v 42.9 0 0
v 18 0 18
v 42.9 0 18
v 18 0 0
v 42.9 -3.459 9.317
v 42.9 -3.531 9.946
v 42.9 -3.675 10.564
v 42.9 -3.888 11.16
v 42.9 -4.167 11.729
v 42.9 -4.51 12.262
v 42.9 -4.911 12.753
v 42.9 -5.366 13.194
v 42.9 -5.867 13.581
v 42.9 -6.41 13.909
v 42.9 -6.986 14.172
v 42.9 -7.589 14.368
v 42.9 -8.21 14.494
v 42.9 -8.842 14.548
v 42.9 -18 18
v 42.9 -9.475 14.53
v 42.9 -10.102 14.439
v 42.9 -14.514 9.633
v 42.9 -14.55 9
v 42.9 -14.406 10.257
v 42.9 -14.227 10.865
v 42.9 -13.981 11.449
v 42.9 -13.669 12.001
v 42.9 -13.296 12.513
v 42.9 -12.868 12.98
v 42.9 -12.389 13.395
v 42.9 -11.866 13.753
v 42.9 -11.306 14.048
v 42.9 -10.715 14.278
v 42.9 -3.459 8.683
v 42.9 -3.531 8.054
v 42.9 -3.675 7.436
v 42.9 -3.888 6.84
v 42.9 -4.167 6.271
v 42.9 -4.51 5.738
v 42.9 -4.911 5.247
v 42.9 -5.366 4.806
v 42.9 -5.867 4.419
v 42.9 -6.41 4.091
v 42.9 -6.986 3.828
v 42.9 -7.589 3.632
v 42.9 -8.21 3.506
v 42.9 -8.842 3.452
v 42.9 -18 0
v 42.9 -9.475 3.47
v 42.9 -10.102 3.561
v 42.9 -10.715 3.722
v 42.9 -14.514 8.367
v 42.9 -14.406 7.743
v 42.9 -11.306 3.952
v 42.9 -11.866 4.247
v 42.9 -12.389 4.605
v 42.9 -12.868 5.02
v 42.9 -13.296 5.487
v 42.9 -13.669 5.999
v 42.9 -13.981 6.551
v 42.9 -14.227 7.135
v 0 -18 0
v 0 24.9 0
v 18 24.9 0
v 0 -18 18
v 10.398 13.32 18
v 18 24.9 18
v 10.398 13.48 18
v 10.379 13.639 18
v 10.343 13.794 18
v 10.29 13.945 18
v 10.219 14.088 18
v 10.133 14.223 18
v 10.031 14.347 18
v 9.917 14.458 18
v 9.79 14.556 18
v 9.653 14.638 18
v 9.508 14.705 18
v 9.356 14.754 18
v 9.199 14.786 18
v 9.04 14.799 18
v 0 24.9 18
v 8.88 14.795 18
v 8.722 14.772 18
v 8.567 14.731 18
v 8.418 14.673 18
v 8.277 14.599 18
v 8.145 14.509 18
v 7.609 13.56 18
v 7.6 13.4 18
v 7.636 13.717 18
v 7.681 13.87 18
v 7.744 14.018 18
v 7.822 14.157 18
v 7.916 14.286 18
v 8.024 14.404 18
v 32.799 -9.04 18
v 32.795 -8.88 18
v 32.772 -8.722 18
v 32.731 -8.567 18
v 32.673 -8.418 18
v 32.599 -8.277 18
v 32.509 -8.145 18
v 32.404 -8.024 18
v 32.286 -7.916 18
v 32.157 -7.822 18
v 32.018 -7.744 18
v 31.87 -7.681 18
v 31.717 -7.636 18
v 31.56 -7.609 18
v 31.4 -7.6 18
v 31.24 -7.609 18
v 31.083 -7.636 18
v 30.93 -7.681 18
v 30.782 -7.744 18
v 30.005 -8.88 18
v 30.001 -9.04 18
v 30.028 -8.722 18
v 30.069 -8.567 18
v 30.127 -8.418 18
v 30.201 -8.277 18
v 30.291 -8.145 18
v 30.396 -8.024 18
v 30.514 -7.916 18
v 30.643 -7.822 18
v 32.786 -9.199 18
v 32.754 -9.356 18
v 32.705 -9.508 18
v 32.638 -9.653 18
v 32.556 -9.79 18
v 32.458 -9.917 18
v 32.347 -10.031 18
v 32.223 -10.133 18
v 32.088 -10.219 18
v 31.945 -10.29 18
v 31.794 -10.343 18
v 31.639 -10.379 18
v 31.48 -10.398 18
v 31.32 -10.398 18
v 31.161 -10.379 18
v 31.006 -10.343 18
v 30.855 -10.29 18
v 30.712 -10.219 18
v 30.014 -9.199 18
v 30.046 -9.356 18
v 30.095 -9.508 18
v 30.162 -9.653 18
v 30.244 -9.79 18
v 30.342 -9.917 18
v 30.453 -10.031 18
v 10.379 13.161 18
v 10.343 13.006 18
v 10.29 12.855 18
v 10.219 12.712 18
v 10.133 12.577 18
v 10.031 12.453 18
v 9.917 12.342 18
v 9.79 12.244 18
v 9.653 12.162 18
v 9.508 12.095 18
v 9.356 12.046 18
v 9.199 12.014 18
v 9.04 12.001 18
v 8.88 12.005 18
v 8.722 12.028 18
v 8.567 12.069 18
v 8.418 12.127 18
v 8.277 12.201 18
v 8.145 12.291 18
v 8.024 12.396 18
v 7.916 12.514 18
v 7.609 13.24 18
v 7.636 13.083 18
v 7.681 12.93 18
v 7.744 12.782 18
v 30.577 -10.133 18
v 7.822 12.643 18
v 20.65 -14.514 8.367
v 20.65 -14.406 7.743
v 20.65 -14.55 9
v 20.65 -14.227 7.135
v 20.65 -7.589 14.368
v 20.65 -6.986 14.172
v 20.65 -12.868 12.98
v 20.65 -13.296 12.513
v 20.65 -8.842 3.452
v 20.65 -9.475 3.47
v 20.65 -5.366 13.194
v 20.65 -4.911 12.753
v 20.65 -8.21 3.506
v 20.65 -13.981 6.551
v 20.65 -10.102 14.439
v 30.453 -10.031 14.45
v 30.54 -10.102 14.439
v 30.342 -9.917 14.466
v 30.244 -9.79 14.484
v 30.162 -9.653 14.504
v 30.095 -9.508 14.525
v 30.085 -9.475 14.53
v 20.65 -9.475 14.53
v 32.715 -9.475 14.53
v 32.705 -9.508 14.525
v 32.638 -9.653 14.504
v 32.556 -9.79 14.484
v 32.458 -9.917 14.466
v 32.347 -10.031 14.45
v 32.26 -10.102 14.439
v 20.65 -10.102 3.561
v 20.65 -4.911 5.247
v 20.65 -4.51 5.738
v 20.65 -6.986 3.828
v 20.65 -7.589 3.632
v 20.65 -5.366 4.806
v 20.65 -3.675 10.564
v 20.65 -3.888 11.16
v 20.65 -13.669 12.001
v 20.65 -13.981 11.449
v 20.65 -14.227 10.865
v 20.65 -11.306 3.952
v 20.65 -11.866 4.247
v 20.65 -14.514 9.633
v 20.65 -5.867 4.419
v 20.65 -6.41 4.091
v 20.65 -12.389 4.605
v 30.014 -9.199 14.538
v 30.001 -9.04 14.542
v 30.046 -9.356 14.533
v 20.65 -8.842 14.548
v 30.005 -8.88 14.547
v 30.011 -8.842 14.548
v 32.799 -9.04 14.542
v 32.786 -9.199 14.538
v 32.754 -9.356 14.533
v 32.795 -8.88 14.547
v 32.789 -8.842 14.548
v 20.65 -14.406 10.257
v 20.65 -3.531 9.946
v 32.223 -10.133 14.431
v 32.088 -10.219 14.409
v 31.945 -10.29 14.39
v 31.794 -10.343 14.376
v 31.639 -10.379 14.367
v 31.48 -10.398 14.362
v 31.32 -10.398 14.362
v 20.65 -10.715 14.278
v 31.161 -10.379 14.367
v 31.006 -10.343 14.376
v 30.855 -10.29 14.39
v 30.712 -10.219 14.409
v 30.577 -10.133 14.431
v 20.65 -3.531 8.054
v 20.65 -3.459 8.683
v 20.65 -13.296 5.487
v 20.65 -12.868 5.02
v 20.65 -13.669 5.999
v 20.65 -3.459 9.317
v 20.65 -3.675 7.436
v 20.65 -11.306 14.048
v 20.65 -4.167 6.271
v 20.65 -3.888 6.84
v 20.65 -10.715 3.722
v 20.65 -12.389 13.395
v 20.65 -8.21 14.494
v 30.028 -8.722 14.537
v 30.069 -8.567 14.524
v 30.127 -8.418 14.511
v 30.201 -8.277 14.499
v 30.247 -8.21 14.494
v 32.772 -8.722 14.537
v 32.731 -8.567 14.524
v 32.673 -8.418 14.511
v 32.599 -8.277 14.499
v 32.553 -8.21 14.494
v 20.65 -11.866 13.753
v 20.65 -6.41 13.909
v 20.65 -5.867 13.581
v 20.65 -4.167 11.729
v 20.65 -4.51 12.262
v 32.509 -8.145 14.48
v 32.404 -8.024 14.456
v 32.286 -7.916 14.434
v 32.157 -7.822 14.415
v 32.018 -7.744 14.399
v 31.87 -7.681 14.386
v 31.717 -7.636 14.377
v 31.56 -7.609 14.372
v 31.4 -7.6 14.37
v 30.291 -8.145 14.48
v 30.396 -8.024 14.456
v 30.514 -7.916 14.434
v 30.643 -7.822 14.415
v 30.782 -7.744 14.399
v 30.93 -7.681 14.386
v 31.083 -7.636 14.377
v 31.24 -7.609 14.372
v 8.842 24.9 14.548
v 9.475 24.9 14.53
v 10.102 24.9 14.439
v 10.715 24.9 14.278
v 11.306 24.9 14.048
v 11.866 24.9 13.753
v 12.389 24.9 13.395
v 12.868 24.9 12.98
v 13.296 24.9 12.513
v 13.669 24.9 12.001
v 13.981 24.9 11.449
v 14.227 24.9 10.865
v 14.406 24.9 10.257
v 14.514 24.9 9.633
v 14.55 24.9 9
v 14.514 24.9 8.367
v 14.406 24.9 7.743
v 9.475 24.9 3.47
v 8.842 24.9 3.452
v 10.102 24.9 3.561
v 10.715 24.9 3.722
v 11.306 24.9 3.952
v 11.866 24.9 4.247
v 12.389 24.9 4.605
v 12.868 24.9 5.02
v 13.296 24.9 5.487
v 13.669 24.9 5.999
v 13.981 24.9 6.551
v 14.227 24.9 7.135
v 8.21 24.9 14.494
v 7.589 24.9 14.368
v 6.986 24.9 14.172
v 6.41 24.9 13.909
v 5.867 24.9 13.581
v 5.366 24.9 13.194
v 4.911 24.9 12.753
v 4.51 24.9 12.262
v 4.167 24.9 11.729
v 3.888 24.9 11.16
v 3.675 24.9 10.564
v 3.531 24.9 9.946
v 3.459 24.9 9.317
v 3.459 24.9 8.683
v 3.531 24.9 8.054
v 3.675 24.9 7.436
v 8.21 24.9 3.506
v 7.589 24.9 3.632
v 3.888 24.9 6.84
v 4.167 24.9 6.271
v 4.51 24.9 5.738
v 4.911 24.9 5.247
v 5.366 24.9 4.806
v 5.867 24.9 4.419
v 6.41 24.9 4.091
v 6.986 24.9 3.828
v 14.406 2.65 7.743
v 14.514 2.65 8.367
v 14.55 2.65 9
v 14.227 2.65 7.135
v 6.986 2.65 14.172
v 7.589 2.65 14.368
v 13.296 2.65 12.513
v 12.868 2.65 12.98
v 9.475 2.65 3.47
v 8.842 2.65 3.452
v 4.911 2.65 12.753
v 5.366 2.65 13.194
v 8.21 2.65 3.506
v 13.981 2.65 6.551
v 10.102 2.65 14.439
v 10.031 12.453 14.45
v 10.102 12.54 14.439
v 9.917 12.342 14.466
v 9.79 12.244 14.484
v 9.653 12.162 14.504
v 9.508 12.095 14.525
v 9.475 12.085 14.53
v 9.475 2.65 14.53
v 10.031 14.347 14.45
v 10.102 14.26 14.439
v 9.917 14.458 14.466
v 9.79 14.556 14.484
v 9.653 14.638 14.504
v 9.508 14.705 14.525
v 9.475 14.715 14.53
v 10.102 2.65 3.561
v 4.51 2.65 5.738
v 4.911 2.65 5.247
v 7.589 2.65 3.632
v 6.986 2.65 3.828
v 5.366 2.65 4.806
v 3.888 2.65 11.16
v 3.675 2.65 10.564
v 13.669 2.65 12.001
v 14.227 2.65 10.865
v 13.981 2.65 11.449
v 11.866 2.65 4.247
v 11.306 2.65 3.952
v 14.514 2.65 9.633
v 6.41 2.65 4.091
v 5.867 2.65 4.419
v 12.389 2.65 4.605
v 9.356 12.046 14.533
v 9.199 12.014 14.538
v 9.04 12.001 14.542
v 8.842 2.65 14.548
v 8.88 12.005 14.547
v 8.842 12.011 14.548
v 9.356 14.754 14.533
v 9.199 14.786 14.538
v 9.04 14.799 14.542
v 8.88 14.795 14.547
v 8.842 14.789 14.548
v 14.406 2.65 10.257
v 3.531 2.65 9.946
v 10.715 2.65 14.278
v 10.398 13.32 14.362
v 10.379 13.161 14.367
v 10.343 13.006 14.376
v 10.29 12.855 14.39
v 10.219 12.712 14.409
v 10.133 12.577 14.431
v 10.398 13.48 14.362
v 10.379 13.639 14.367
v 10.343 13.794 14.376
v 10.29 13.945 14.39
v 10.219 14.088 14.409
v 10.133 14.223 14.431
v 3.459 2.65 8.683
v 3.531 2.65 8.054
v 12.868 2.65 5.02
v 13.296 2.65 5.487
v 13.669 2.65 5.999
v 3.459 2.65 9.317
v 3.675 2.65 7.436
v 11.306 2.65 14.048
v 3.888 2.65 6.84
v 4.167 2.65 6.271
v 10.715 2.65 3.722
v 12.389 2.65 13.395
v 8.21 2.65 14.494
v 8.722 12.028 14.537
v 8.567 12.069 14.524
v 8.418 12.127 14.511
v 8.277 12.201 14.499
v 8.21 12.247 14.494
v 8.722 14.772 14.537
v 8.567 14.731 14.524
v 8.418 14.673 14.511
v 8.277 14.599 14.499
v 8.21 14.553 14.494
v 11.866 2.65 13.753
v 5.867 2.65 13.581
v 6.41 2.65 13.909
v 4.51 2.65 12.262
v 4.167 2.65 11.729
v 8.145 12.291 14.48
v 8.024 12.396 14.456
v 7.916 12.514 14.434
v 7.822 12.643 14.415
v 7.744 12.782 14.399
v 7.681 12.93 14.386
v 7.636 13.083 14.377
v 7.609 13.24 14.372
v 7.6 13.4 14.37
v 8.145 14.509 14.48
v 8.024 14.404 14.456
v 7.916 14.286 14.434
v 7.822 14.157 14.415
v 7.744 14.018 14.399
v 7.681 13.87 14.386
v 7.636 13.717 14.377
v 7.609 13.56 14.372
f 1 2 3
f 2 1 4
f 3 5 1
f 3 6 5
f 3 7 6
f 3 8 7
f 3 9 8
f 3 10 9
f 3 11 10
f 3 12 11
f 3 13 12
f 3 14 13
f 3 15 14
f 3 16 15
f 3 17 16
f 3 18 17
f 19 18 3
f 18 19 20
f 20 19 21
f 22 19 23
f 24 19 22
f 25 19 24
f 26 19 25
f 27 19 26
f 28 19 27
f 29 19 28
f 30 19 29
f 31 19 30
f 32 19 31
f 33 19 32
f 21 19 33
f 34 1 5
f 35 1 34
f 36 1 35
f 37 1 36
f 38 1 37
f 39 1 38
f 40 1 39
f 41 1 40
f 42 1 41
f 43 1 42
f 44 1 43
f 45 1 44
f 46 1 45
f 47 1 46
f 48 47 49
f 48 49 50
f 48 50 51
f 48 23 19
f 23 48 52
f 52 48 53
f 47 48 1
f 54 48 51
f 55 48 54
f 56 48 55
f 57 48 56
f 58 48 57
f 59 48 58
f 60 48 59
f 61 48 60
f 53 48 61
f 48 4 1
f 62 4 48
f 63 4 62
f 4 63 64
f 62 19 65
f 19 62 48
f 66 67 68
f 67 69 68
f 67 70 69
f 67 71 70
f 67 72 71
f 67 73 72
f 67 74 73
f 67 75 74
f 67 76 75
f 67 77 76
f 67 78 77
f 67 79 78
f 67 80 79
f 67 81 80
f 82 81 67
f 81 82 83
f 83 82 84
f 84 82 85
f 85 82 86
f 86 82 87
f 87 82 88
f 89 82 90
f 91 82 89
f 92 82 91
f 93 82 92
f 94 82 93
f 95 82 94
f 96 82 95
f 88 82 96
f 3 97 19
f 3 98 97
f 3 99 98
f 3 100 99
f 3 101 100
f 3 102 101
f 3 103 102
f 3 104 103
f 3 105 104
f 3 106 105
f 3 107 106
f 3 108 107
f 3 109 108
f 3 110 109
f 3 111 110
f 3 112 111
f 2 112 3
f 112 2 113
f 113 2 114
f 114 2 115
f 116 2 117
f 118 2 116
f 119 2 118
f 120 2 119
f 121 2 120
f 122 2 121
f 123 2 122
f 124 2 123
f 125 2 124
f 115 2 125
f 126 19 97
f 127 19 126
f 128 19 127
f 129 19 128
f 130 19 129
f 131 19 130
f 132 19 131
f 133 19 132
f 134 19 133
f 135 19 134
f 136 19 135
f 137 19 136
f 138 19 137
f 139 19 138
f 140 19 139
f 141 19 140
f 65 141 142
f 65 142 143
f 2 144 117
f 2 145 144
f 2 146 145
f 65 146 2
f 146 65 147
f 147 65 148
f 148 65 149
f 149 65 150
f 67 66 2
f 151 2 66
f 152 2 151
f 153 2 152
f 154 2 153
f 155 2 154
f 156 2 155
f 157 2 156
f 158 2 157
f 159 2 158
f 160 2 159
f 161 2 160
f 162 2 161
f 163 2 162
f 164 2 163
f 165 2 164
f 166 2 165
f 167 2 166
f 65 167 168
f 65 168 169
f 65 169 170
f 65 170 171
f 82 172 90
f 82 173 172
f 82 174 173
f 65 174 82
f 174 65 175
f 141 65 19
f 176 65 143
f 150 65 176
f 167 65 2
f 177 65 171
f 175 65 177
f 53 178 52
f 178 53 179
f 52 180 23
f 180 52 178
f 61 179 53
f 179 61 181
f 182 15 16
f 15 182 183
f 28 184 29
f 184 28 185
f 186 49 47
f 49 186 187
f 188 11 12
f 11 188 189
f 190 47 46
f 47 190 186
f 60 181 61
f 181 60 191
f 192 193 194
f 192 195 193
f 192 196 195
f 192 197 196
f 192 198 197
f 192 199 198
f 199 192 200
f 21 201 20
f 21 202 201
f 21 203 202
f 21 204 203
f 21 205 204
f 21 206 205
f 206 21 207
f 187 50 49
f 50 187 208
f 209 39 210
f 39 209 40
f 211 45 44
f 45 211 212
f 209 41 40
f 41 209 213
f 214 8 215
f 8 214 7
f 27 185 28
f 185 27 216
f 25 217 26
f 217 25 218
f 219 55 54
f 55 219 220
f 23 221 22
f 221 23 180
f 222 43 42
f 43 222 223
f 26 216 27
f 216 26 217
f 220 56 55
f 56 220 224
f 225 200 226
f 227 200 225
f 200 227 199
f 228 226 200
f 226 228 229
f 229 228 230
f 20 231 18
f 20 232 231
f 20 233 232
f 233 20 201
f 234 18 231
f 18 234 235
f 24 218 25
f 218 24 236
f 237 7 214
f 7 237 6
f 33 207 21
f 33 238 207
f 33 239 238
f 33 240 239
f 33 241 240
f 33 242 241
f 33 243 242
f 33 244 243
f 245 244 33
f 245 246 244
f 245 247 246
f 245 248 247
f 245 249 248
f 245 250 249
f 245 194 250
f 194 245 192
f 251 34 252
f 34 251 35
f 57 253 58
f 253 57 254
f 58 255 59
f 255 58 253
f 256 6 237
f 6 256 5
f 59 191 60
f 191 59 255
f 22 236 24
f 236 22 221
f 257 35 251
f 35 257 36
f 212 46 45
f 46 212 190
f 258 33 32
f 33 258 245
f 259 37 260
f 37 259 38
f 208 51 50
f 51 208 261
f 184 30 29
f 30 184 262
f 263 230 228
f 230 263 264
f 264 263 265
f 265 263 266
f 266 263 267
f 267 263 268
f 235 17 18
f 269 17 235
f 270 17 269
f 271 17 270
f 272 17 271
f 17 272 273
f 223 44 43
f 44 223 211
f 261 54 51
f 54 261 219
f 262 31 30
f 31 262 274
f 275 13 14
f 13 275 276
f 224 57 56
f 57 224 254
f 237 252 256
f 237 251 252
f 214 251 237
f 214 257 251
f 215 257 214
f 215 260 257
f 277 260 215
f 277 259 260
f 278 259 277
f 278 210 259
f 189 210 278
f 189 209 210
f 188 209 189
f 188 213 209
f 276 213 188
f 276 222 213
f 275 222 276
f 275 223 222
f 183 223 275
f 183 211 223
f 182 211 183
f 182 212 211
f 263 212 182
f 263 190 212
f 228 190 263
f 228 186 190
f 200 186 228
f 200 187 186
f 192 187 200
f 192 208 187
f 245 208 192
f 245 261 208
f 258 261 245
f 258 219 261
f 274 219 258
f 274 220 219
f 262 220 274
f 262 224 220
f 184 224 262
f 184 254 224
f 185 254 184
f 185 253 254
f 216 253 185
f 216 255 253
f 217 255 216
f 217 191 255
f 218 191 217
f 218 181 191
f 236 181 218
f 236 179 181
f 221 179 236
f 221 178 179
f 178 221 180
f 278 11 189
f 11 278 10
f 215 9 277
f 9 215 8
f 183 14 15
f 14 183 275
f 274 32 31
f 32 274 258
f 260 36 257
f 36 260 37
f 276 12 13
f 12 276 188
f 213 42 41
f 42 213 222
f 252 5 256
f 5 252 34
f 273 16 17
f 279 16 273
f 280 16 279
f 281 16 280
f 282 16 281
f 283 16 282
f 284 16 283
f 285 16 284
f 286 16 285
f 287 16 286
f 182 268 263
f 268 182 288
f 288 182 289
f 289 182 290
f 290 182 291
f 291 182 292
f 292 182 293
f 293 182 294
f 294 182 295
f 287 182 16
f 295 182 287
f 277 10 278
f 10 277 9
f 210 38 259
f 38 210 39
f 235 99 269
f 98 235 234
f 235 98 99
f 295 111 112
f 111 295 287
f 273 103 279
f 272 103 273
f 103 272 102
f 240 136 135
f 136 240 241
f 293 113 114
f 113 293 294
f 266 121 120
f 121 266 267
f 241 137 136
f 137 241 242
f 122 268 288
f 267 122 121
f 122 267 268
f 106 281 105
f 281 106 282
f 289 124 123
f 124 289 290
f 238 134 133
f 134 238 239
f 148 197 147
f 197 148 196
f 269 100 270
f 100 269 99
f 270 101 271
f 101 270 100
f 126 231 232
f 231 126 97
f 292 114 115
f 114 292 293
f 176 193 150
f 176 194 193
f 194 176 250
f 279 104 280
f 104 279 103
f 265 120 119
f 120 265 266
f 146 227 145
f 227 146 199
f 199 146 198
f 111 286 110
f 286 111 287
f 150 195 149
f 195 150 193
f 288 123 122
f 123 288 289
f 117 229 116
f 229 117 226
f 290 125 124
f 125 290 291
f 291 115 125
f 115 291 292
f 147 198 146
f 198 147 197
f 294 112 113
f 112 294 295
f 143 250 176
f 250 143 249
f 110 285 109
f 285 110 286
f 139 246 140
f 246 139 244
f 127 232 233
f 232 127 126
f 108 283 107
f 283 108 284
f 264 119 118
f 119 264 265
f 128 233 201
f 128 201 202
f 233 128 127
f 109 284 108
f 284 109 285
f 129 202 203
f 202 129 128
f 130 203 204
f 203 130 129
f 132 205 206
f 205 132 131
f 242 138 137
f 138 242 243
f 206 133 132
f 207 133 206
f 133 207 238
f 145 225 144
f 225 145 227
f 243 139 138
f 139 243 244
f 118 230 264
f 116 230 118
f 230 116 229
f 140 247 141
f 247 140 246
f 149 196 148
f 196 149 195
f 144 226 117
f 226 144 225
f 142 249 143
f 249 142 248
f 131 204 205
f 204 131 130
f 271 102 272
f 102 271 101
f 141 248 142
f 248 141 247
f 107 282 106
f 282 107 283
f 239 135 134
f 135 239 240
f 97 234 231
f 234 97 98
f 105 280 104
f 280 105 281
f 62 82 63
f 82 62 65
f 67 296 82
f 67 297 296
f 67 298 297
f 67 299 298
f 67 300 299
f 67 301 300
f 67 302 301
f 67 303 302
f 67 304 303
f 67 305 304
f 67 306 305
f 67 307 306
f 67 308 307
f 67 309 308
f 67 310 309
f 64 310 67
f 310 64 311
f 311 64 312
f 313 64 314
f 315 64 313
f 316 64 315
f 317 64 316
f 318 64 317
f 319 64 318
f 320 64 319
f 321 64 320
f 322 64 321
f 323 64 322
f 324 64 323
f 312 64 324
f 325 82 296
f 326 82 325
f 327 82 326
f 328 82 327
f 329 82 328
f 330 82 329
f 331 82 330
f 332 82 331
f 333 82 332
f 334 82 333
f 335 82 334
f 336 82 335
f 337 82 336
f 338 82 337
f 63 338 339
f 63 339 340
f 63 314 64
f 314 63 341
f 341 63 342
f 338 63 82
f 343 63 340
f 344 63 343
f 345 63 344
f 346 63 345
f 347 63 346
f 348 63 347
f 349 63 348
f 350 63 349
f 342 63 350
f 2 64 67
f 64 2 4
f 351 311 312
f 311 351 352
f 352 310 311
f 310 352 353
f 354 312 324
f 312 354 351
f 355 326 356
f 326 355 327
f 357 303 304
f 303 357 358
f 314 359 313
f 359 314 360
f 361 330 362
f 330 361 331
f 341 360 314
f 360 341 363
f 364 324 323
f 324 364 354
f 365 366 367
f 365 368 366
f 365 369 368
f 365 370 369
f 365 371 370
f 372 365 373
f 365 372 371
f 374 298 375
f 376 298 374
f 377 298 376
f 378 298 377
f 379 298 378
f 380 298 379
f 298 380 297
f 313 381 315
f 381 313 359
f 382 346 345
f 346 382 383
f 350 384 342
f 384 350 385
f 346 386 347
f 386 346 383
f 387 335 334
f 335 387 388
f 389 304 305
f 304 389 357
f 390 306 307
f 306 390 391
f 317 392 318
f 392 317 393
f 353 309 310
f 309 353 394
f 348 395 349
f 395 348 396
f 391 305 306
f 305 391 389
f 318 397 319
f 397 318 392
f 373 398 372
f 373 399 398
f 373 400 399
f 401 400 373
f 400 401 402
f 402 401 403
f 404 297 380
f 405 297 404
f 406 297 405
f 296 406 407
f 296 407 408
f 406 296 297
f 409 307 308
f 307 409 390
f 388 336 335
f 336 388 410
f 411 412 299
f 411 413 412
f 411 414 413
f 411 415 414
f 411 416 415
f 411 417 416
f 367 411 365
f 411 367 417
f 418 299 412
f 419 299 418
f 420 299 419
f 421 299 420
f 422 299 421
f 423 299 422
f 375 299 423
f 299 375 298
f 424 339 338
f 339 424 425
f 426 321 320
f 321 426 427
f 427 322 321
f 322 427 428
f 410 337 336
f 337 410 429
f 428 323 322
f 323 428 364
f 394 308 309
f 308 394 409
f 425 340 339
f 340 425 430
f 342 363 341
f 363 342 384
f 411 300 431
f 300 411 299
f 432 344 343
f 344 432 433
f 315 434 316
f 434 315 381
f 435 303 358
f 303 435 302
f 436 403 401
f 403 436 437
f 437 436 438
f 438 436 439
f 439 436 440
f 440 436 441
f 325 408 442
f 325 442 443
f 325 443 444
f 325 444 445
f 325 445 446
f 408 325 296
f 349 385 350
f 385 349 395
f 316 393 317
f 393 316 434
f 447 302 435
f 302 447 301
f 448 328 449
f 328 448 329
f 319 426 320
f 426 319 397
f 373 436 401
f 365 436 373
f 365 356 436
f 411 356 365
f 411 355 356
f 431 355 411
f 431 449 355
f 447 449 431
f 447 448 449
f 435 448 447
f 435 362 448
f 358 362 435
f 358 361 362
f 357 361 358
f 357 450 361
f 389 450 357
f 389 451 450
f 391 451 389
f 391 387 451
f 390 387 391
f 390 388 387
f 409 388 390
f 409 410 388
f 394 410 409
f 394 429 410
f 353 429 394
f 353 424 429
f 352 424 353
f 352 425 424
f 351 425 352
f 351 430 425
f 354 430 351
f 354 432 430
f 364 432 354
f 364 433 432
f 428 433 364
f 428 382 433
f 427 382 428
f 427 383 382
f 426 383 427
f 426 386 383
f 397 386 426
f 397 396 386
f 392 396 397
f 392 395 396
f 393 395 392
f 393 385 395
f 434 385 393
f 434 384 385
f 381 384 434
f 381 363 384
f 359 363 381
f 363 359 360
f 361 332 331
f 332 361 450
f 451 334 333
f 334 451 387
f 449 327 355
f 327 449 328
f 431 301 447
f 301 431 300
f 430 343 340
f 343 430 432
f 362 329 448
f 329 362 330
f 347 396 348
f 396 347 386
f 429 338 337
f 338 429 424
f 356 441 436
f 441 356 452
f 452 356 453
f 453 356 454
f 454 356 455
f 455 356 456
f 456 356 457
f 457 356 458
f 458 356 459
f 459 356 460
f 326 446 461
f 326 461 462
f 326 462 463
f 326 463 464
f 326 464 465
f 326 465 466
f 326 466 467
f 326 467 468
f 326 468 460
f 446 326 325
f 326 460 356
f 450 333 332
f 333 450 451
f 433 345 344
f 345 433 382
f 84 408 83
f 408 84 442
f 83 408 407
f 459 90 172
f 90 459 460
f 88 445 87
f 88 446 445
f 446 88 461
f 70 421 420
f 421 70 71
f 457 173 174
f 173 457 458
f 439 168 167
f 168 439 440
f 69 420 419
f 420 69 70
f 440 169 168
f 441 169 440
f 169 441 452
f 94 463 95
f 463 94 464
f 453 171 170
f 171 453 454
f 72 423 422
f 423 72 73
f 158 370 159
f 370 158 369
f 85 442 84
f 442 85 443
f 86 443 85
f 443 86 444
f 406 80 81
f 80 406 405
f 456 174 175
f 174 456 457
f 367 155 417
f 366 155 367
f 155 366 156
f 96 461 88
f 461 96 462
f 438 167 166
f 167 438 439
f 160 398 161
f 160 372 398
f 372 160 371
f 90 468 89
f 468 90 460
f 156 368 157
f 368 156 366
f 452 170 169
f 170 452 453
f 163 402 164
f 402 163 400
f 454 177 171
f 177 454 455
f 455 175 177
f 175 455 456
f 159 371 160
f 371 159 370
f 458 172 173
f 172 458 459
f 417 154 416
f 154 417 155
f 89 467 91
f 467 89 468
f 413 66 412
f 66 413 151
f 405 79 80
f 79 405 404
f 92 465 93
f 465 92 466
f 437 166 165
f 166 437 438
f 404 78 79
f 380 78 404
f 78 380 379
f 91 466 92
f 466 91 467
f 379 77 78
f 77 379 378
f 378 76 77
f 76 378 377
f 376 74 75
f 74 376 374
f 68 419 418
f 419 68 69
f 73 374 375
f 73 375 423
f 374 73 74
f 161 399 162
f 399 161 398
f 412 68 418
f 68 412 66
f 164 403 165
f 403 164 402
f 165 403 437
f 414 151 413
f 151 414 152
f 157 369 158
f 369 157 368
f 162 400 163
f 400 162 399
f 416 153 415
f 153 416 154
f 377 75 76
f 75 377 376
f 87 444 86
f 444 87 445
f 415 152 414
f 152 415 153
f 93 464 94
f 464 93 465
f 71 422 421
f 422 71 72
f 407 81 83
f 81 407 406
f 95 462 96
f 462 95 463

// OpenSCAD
//cross-section size of coupler
cross_section = 18;
//length of each spoke of the coupler
coupler_length = 25;
//diameter of the tube hole
pipe_diameter = 11.1;
//diameter of the screw hole, 0 for none
screw_diameter = 2.8;
//type of coupler to make
coupler_type = 2;//[1: Straight, 2: L-coupler, 3: T-coupler, 4: Cross coupler]
//resolution (Segments per circle)
$fn=55;
module base_shape() {
    translate([0, 0, -0.1])//may be unnecessary - ensure no gaps in shape
    difference()
    {
        linear_extrude(height = coupler_length)
            square(cross_section);
        translate ([cross_section / 2, cross_section / 2, coupler_length * 0.11])
            cylinder(d = pipe_diameter, h= (coupler_length * 0.90));
        screw_hole();
    };
}

module screw_hole() {
    translate([cross_section / 2, cross_section / 2, cross_section * 0.75])
        rotate([-90, 0, 180])
            cylinder(d = screw_diameter, h = cross_section);
}

module straight_coupler() {
    union() {
        translate([cross_section, 0, cross_section])
        rotate([90, 180, 0])
                base_shape();
        translate([0, 0, cross_section])
            rotate([-90, 0, 0])
            base_shape();
    }
}

module l_coupler() {
       union() {
        translate([cross_section, 0, cross_section])
        rotate([90, 180, 90])
                base_shape();
        translate([0, 0, cross_section])
            rotate([-90, 0, 0])
            base_shape();
        translate([0, -cross_section, 0])
           cube(cross_section);
    } 
}

module t_coupler() {
    union () {
        straight_coupler();
        translate([0, -cross_section / 2, cross_section])
            rotate([-90, 0, 90])
            base_shape();
    }
}

module x_coupler() {
        union () {
        t_coupler();
        translate([cross_section, cross_section / 2, cross_section])
            rotate([-90, 0, -90])
            base_shape();
    }
}

if (coupler_type == 1) {
    straight_coupler();
} else if (coupler_type == 2) {
    l_coupler();
} else if (coupler_type == 3) {
    t_coupler();
} else if (coupler_type == 4) {
    x_coupler();
} else {
    echo("Invalid coupler type selected!");
}
